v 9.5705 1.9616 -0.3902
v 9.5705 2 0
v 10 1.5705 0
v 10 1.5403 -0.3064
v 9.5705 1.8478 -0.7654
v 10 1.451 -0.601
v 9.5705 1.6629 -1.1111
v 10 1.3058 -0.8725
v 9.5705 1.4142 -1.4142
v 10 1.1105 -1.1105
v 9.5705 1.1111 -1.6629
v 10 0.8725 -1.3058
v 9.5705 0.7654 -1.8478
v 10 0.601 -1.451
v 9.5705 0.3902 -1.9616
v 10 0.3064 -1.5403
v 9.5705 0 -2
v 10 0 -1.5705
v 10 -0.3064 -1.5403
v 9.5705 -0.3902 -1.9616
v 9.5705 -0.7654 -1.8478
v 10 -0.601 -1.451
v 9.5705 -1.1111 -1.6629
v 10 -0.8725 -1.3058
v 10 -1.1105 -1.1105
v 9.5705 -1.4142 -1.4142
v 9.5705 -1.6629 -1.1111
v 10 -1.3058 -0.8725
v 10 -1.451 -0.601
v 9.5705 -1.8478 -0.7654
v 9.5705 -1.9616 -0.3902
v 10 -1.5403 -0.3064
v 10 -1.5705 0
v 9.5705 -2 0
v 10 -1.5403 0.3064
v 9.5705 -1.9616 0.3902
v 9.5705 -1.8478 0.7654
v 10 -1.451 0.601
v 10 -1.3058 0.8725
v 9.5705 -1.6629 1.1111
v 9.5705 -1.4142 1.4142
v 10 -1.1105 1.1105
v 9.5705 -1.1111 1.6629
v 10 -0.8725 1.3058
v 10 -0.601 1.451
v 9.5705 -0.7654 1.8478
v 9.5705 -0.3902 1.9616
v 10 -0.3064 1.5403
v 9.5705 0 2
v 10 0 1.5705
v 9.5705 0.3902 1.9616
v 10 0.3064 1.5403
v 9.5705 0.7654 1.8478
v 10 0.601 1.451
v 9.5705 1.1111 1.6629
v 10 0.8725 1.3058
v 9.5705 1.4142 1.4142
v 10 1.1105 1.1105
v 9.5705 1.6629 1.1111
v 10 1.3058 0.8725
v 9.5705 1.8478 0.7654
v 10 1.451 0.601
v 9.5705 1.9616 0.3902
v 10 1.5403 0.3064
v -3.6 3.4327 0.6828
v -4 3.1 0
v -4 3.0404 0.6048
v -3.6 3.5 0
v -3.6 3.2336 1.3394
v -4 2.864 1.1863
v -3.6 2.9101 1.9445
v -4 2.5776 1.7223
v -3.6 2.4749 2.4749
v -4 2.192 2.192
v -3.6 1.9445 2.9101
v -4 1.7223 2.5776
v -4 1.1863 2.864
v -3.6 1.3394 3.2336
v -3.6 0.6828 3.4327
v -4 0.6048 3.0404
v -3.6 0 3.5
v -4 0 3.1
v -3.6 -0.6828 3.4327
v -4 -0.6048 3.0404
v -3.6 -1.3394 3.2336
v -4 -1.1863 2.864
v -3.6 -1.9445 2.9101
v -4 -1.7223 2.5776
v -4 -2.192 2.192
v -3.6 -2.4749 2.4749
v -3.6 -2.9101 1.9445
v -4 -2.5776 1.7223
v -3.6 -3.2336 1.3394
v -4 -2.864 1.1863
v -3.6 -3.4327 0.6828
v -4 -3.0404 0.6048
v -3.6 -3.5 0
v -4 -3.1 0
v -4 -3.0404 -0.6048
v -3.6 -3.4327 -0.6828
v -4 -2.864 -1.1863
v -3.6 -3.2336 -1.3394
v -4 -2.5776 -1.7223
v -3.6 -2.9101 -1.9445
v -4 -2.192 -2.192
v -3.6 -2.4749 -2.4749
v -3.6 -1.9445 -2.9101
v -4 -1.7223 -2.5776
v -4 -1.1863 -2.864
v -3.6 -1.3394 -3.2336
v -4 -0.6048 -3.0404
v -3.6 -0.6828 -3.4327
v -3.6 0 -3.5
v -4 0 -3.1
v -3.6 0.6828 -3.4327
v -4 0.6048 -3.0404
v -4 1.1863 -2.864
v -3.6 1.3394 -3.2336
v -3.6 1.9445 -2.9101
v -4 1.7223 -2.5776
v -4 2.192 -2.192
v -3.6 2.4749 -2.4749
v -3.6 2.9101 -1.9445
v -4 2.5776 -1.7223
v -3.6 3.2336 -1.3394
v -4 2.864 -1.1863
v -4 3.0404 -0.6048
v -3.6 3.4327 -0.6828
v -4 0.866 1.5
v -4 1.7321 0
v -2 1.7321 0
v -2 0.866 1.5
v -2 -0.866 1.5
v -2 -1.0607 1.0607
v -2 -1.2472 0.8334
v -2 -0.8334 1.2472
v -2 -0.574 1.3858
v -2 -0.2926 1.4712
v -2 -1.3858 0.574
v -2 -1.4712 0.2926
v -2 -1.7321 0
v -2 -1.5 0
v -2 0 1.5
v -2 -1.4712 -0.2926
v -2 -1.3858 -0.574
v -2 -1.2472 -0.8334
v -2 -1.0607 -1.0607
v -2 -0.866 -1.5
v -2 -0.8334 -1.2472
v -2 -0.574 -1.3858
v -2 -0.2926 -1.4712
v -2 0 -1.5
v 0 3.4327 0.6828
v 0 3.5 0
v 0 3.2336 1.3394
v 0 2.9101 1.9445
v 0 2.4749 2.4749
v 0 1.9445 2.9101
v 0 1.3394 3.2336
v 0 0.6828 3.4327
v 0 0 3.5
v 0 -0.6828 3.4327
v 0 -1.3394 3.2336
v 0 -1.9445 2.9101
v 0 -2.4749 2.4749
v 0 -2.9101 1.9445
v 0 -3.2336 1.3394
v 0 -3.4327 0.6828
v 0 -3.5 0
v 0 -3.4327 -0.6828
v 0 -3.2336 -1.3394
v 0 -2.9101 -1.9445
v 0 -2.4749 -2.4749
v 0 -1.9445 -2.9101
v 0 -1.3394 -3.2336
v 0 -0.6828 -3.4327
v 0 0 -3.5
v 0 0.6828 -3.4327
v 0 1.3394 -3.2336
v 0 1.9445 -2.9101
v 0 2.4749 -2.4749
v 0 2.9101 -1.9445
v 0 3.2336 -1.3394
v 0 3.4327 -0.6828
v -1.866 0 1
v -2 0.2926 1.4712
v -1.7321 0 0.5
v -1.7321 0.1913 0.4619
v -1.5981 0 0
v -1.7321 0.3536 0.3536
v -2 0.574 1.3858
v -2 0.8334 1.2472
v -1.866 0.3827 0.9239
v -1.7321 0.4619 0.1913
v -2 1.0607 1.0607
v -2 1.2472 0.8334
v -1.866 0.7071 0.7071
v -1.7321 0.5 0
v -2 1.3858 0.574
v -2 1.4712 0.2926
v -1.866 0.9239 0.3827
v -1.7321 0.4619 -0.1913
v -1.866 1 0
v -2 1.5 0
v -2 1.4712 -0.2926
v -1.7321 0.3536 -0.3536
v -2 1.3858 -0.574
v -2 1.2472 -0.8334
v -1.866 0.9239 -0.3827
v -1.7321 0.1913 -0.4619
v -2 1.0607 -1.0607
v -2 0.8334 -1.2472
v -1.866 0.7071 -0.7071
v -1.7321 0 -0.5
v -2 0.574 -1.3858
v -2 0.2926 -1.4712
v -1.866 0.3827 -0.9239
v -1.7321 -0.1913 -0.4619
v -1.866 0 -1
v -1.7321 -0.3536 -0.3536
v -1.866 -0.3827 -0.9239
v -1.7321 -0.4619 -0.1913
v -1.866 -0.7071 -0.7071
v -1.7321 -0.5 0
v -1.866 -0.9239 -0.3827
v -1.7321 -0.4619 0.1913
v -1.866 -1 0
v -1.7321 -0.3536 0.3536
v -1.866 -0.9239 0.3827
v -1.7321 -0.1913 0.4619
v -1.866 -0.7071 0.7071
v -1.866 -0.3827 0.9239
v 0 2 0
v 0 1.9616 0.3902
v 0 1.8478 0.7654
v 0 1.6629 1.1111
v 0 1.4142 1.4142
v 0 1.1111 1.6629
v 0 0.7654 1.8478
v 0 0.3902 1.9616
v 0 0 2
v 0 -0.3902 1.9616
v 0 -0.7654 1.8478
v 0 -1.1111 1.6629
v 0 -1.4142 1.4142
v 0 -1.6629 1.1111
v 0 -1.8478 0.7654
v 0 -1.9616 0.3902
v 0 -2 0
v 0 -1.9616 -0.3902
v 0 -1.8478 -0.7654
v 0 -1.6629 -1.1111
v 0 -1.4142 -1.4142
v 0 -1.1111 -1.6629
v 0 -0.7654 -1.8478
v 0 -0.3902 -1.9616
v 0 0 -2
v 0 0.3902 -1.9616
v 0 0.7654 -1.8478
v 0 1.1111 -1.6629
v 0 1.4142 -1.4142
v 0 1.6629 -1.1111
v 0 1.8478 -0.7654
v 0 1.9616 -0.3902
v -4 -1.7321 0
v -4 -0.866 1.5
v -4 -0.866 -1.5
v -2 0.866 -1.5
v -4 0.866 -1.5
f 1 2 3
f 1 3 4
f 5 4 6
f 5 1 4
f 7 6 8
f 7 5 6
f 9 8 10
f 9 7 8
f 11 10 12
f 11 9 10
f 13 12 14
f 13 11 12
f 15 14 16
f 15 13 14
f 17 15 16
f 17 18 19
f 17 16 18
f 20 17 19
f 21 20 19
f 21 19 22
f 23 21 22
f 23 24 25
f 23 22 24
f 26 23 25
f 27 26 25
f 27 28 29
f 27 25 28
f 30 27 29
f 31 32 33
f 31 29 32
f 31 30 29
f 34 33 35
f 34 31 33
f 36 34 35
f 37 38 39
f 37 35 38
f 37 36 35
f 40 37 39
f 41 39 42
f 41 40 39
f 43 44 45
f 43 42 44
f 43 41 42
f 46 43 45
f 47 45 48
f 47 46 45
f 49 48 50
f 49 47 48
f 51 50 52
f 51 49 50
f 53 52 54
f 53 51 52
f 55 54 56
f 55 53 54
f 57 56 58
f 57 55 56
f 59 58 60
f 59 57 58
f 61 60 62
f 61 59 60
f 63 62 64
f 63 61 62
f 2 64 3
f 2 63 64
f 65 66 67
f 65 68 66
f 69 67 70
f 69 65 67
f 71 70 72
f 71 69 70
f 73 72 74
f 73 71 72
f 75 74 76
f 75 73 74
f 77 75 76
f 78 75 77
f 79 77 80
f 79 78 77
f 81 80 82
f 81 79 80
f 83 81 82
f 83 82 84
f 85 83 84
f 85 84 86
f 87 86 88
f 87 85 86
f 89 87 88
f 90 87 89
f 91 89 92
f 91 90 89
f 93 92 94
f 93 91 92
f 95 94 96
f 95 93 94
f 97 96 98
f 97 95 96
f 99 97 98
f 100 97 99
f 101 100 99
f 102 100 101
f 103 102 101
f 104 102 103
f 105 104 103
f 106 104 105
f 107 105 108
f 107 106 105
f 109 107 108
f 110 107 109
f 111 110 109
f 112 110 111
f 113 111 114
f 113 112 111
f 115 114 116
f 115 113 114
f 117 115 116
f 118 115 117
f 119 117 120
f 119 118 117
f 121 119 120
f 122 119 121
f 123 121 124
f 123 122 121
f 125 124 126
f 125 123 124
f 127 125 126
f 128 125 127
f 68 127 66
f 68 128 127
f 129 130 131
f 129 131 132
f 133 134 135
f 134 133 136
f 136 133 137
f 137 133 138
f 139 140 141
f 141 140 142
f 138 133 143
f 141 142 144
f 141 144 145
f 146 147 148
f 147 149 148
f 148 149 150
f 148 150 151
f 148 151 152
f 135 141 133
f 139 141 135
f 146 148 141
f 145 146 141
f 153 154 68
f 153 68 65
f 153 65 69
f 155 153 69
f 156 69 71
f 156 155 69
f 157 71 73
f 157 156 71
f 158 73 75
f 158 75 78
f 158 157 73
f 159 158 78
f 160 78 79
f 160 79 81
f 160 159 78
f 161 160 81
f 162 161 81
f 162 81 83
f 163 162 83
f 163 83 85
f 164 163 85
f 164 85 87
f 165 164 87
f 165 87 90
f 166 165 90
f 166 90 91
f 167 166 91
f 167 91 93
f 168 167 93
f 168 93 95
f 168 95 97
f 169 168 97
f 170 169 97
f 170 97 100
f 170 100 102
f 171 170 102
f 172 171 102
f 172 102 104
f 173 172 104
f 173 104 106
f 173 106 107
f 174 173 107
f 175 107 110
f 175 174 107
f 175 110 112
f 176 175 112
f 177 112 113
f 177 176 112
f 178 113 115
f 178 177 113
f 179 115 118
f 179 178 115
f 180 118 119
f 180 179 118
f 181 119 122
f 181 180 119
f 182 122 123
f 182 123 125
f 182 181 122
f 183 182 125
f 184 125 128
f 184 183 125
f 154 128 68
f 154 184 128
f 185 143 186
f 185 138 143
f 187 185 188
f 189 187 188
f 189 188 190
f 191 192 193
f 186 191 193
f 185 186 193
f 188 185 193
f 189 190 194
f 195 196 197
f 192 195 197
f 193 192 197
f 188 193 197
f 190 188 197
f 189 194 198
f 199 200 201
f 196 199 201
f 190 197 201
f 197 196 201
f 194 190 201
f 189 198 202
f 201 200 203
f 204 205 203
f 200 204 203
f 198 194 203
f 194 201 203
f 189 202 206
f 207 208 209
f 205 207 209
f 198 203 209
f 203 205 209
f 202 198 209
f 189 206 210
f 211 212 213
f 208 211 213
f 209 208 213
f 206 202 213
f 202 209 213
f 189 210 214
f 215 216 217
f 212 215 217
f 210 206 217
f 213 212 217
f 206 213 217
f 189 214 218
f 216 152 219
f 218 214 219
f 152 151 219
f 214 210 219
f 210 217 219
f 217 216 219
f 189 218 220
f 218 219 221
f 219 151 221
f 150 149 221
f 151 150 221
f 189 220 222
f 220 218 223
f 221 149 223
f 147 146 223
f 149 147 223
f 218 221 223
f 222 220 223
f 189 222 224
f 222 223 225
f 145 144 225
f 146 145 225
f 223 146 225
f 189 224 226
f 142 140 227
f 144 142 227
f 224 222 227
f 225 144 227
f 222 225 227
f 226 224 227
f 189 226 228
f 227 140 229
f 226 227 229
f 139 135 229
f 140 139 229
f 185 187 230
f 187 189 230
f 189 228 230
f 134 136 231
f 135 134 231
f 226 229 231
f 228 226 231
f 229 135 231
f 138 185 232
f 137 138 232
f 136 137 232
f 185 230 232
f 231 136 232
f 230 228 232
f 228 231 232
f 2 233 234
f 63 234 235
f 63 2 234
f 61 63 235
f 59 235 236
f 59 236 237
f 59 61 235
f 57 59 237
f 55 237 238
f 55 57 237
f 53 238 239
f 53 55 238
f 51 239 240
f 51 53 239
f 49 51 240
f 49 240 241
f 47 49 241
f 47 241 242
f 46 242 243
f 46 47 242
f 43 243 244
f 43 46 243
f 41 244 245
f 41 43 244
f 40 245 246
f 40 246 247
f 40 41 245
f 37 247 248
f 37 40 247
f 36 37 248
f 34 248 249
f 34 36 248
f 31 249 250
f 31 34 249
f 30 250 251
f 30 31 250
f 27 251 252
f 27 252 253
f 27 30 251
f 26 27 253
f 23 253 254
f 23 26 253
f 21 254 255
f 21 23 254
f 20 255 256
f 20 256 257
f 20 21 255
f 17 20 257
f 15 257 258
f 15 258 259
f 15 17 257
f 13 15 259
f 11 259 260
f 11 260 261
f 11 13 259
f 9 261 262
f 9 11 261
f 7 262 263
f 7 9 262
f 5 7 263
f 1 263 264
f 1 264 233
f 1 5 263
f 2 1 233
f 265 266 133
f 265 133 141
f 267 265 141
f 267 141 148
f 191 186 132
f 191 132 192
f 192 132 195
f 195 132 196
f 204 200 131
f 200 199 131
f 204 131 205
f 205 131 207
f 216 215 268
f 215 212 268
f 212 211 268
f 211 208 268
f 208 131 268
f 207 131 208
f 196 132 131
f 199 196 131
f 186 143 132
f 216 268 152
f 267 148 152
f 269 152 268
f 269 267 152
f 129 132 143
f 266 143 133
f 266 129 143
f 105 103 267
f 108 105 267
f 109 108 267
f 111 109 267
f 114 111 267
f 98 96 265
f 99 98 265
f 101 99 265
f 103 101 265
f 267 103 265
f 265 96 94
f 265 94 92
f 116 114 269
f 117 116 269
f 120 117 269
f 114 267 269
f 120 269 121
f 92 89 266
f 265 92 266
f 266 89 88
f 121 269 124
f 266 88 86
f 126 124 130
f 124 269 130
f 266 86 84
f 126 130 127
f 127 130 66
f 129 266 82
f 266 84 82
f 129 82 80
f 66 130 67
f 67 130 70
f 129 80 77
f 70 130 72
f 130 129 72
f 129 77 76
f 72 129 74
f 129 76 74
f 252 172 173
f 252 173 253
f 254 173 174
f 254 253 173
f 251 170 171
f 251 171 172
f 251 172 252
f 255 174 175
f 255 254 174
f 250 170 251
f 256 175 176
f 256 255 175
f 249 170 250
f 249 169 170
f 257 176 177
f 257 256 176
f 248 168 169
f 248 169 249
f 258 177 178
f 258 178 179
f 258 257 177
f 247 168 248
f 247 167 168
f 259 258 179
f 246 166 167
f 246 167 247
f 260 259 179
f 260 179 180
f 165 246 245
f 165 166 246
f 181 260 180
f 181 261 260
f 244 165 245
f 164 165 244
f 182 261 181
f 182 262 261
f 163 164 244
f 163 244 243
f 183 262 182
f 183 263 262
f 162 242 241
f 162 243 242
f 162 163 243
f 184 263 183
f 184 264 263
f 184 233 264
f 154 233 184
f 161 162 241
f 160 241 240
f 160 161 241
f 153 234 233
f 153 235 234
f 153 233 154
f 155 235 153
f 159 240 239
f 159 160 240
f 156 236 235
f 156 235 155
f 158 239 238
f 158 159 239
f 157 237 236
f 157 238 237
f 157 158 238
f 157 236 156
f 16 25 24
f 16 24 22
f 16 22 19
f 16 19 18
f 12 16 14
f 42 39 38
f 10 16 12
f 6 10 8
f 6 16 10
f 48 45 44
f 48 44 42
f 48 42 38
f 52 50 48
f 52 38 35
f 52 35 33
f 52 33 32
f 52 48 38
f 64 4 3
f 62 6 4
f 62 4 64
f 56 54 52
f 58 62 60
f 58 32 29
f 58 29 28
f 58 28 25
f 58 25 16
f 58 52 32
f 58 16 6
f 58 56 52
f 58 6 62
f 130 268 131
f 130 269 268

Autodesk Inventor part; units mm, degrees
sketch "Sketch_1" plane through (0, 0, 0) normal (0, 0, 1) x (1, 0, 0)
  line L0 (10, 0) -> (-4, 0)
  line L1 (-4, 0) -> (-4, 3.1)
  line L2 (-4, 3.1) -> (-3.6, 3.5)
  line L3 (-3.6, 3.5) -> (0, 3.5)
  line L4 (0, 3.5) -> (0, 2)
  line L5 (0, 2) -> (9.5705, 2)
  line L6 (9.5705, 2) -> (10, 1.5705)
  line L7 (10, 1.5705) -> (10, 0)
  line L8 (10, 0) -> (-4, 0)
revolve "Revolution1" add sketch "Sketch_1" angle 360 about axis through (10, 0, 0) along (1, 0, 0)
thread "Thread1" size "M4x0.7" class "6g" standard "ISO Metric profile" length 8.5705
sketch "Sketch2" plane through (-4, 0, 0) normal (-1, 0, 0) x (0, 0, 1)
  point P0 (0, 0)
hole "Hole1" at (-4, 0, 0) direction (1, 0, 0) diameter 3 depth 2 tip angle 150
sketch "Sketch_3" plane through (-4, 0, 0) normal (1, 0, 0) x (0, 0, -1)
  line L0 (-1.5, -0.866) -> (0, -1.7321)
  line L1 (0, -1.7321) -> (1.5, -0.866)
  line L2 (1.5, -0.866) -> (1.5, 0.866)
  line L3 (1.5, 0.866) -> (0, 1.7321)
  line L4 (0, 1.7321) -> (-1.5, 0.866)
  line L5 (-1.5, 0.866) -> (-1.5, -0.866)
extrude "Extrusion1" cut sketch "Sketch_3" along normal blind 2
ref_plane "bolt_to_nut_XY" through (10, 0, 0) normal (1, 0, 0) x (0, 0, -1)
ref_plane "bolt_to_nut_YZ" through (10, 0, 0) normal (0, 0, -1) x (0, 1, 0)
ref_plane "bolt_to_nut_ZX" through (10, 0, 0) normal (0, 1, 0) x (1, 0, 0)
ref_plane "screw1_XY" through (0, 0, 0) normal (1, 0, 0) x (0, 0, -1)
ref_plane "screw1_YZ" through (0, 0, 0) normal (0, 0, -1) x (0, 1, 0)
ref_plane "screw1_ZX" through (0, 0, 0) normal (0, 1, 0) x (1, 0, 0)
properties part number "CB4-10" material "鋼、炭素鋼"
